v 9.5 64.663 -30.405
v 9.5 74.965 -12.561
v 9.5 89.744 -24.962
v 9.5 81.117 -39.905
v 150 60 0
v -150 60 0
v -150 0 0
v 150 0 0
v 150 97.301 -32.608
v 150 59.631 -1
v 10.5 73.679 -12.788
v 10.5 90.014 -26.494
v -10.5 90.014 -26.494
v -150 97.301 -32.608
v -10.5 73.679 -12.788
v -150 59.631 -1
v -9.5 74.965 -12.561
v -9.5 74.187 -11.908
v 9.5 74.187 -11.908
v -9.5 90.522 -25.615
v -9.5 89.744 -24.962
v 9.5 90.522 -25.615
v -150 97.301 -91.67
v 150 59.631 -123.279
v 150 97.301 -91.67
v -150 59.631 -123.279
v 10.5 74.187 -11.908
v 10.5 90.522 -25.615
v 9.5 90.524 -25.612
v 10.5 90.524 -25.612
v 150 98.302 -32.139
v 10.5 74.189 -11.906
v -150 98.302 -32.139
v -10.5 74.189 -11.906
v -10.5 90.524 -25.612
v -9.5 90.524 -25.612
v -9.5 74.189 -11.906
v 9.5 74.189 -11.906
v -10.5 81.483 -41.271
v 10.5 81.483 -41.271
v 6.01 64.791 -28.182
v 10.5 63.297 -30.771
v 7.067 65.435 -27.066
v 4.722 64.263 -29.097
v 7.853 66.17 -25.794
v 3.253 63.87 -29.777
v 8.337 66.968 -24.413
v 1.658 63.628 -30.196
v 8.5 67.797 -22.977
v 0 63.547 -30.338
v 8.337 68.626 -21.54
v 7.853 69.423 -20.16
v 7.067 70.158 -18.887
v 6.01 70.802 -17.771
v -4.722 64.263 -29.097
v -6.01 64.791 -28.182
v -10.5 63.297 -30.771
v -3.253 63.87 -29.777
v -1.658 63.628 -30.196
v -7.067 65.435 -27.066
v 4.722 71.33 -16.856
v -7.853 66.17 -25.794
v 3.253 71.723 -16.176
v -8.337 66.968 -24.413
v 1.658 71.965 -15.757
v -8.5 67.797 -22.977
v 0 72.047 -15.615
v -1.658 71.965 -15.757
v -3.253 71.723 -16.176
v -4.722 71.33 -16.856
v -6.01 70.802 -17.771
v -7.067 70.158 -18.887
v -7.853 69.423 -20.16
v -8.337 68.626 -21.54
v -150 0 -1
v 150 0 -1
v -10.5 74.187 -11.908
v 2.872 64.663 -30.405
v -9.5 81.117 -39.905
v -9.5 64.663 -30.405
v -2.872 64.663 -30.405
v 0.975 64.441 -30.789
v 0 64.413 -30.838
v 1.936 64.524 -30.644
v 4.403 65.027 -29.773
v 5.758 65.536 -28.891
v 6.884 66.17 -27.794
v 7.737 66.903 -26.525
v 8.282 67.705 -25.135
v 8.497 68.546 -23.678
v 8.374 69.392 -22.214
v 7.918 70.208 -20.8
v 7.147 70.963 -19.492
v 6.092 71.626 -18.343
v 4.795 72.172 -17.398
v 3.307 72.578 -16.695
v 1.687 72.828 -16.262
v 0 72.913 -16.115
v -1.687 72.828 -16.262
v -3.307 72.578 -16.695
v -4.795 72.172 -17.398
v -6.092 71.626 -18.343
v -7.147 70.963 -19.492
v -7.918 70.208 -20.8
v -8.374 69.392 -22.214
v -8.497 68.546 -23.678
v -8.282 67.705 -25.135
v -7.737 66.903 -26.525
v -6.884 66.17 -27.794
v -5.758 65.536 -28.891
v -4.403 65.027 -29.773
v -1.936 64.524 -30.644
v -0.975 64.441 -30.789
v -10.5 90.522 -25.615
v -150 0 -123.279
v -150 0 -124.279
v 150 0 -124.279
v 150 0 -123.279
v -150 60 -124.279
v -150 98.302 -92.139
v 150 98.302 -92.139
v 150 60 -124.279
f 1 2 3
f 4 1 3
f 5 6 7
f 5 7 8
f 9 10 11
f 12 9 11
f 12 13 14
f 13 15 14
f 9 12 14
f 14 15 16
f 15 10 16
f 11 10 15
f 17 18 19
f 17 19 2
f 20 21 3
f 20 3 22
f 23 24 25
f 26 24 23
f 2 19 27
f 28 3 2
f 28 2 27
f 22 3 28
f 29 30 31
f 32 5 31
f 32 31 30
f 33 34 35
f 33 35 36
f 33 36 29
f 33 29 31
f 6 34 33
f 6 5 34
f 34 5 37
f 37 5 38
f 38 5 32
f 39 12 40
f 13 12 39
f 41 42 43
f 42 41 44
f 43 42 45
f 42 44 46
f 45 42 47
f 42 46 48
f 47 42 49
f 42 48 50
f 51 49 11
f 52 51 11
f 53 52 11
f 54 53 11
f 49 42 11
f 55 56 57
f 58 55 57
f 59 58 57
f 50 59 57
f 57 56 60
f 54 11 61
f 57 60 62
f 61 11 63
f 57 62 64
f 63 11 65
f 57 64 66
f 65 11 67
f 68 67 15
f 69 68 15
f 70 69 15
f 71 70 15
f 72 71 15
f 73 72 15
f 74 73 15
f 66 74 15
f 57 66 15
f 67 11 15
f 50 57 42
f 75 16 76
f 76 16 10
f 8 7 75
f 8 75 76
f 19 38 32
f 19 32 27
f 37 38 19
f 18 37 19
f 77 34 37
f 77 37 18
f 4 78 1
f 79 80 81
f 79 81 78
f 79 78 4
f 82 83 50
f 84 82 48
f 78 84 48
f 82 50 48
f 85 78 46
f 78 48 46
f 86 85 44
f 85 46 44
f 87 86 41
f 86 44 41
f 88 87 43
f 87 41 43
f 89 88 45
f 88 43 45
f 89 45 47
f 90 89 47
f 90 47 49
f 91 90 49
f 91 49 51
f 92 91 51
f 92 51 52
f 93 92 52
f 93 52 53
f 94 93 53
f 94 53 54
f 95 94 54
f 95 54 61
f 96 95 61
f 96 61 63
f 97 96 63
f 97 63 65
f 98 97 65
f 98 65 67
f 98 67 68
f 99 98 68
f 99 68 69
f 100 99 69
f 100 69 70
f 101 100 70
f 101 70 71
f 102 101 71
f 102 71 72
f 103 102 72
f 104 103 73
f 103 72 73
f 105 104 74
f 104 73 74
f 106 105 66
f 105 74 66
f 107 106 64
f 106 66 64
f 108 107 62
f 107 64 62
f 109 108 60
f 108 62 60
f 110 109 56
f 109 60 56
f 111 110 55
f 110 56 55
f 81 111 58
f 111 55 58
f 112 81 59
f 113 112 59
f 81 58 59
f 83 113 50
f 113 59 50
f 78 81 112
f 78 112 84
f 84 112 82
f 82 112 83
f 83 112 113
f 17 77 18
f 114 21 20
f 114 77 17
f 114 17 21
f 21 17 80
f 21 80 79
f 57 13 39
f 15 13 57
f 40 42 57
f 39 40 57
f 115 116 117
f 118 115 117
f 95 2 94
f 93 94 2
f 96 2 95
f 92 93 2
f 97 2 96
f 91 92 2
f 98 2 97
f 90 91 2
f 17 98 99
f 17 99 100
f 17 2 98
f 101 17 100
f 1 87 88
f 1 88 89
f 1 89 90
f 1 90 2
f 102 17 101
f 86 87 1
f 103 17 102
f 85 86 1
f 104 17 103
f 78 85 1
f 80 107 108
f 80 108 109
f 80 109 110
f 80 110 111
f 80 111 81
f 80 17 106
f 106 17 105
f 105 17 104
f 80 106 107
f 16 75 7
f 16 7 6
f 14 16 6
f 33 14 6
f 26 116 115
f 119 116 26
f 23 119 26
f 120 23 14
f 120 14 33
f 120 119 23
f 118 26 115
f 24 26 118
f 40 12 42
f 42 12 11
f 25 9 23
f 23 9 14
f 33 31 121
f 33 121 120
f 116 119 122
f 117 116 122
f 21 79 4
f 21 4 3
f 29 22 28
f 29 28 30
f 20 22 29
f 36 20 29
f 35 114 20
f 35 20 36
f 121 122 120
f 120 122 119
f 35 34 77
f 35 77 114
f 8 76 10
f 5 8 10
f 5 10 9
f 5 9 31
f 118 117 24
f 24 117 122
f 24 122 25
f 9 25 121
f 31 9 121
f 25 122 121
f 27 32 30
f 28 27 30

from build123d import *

# Parameters (mm, degrees)
SKETCH_1_W          = 300
SKETCH_1_H          = 60
EXTRUDE_1_DEPTH     = 1
SKETCH_4_W          = 300
SKETCH_4_H          = 1.002930946
EXTRUDE_2_DEPTH     = 50
SKETCH_5_W          = 300
SKETCH_5_H          = 1.001378412
EXTRUDE_3_DEPTH     = 60
SKETCH_11_W         = 21
SKETCH_11_H         = 21
EXTRUDE_5_DEPTH     = 25
SHELL_START         = -9.5
SHELL_1_DEPTH       = 19
SHELL_START_2       = -10.5
SHELL_1_2_DEPTH     = 21
SKETCH_12_R         = 8.5
CUT_EXTRUDE_4_DEPTH = 1


# Read off the part's stored shape, not the designer's step: 抽壳1
with BuildPart() as part:
    # 草图1 → 凸台-拉伸1 (new body)
    with BuildSketch(Plane.XY):
        with Locations((0, 30)):
            Rectangle(SKETCH_1_W, SKETCH_1_H)
    extrude_1 = extrude(amount=-EXTRUDE_1_DEPTH)

    # 草图4 → 凸台-拉伸2 (add)
    with BuildSketch(Plane(origin=(0, 35.20944533, -29.54423259), x_dir=(-1, 0, 0), z_dir=(0, 0.7660444431189771, -0.6427876096865406))):
        with Locations((0, 38.065791108)):
            Rectangle(SKETCH_4_W, SKETCH_4_H)
    extrude_2 = extrude(amount=EXTRUDE_2_DEPTH)

    # 草图5 → 凸台-拉伸3 (add)
    with BuildSketch(Plane(origin=(0, 0, -32.139380484), x_dir=(-1, 0, 0), z_dir=(0, 0, -1))):
        with Locations((0, 97.80153295)):
            Rectangle(SKETCH_5_W, SKETCH_5_H)
    extrude(amount=EXTRUDE_3_DEPTH)

    # 镜向1: 凸台-拉伸2 across plane
    add(extrude_2.mirror(Plane.XY.offset(-62.139380484)))

    # 镜向2: 凸台-拉伸1 across plane
    add(extrude_1.mirror(Plane.XY.offset(-62.139380484)))

    # 草图11 → 凸台-拉伸5 (add)
    with BuildSketch(Plane(origin=(0, 15, 25.980762114), x_dir=(-1, 0, 0), z_dir=(0, 0.500000000000001, 0.8660254037844382))):
        with Locations((0, -80.701911878)):
            Rectangle(SKETCH_11_W, SKETCH_11_H)
    extrude(amount=-EXTRUDE_5_DEPTH)

    # 抽壳1 outline → 抽壳1 (cut)
    with BuildSketch(Plane.YZ.offset(SHELL_START)):
        Polygon((89.744253028, -24.962217823), (90.522114942, -25.614921468), (90.523603022, -25.612344038), (93.98317256, -19.620193825), (75.79663908, -9.120193825), (74.18850284, -11.9055675), (74.187014759, -11.90814493), (74.964876673, -12.560848575), (64.662664484, -30.404803516), (81.117147156, -39.904803516), align=None)
    extrude(amount=SHELL_1_DEPTH, mode=Mode.SUBTRACT)

    # Shell 1 2 outline → Shell 1 2 (cut)
    with BuildSketch(Plane.YZ.offset(SHELL_START_2)):
        Polygon((74.187014759, -11.90814493), (90.522114942, -25.614921468), (90.523603022, -25.612344038), (93.98317256, -19.620193825), (75.79663908, -9.120193825), (74.18850284, -11.9055675), align=None)
    extrude(amount=SHELL_1_2_DEPTH, mode=Mode.SUBTRACT)

    # 草图12 → 切除-拉伸4 (cut)
    with BuildSketch(Plane(origin=(0, 60.79663908, -35.100955939), x_dir=(1, 0, 0), z_dir=(0, -0.8660254037844382, 0.5000000000000011))):
        with Locations(Location((0, 14, 0), (0, 0, 270))):
            Circle(SKETCH_12_R)
    extrude(amount=-CUT_EXTRUDE_4_DEPTH, mode=Mode.SUBTRACT)


solid = part.part
